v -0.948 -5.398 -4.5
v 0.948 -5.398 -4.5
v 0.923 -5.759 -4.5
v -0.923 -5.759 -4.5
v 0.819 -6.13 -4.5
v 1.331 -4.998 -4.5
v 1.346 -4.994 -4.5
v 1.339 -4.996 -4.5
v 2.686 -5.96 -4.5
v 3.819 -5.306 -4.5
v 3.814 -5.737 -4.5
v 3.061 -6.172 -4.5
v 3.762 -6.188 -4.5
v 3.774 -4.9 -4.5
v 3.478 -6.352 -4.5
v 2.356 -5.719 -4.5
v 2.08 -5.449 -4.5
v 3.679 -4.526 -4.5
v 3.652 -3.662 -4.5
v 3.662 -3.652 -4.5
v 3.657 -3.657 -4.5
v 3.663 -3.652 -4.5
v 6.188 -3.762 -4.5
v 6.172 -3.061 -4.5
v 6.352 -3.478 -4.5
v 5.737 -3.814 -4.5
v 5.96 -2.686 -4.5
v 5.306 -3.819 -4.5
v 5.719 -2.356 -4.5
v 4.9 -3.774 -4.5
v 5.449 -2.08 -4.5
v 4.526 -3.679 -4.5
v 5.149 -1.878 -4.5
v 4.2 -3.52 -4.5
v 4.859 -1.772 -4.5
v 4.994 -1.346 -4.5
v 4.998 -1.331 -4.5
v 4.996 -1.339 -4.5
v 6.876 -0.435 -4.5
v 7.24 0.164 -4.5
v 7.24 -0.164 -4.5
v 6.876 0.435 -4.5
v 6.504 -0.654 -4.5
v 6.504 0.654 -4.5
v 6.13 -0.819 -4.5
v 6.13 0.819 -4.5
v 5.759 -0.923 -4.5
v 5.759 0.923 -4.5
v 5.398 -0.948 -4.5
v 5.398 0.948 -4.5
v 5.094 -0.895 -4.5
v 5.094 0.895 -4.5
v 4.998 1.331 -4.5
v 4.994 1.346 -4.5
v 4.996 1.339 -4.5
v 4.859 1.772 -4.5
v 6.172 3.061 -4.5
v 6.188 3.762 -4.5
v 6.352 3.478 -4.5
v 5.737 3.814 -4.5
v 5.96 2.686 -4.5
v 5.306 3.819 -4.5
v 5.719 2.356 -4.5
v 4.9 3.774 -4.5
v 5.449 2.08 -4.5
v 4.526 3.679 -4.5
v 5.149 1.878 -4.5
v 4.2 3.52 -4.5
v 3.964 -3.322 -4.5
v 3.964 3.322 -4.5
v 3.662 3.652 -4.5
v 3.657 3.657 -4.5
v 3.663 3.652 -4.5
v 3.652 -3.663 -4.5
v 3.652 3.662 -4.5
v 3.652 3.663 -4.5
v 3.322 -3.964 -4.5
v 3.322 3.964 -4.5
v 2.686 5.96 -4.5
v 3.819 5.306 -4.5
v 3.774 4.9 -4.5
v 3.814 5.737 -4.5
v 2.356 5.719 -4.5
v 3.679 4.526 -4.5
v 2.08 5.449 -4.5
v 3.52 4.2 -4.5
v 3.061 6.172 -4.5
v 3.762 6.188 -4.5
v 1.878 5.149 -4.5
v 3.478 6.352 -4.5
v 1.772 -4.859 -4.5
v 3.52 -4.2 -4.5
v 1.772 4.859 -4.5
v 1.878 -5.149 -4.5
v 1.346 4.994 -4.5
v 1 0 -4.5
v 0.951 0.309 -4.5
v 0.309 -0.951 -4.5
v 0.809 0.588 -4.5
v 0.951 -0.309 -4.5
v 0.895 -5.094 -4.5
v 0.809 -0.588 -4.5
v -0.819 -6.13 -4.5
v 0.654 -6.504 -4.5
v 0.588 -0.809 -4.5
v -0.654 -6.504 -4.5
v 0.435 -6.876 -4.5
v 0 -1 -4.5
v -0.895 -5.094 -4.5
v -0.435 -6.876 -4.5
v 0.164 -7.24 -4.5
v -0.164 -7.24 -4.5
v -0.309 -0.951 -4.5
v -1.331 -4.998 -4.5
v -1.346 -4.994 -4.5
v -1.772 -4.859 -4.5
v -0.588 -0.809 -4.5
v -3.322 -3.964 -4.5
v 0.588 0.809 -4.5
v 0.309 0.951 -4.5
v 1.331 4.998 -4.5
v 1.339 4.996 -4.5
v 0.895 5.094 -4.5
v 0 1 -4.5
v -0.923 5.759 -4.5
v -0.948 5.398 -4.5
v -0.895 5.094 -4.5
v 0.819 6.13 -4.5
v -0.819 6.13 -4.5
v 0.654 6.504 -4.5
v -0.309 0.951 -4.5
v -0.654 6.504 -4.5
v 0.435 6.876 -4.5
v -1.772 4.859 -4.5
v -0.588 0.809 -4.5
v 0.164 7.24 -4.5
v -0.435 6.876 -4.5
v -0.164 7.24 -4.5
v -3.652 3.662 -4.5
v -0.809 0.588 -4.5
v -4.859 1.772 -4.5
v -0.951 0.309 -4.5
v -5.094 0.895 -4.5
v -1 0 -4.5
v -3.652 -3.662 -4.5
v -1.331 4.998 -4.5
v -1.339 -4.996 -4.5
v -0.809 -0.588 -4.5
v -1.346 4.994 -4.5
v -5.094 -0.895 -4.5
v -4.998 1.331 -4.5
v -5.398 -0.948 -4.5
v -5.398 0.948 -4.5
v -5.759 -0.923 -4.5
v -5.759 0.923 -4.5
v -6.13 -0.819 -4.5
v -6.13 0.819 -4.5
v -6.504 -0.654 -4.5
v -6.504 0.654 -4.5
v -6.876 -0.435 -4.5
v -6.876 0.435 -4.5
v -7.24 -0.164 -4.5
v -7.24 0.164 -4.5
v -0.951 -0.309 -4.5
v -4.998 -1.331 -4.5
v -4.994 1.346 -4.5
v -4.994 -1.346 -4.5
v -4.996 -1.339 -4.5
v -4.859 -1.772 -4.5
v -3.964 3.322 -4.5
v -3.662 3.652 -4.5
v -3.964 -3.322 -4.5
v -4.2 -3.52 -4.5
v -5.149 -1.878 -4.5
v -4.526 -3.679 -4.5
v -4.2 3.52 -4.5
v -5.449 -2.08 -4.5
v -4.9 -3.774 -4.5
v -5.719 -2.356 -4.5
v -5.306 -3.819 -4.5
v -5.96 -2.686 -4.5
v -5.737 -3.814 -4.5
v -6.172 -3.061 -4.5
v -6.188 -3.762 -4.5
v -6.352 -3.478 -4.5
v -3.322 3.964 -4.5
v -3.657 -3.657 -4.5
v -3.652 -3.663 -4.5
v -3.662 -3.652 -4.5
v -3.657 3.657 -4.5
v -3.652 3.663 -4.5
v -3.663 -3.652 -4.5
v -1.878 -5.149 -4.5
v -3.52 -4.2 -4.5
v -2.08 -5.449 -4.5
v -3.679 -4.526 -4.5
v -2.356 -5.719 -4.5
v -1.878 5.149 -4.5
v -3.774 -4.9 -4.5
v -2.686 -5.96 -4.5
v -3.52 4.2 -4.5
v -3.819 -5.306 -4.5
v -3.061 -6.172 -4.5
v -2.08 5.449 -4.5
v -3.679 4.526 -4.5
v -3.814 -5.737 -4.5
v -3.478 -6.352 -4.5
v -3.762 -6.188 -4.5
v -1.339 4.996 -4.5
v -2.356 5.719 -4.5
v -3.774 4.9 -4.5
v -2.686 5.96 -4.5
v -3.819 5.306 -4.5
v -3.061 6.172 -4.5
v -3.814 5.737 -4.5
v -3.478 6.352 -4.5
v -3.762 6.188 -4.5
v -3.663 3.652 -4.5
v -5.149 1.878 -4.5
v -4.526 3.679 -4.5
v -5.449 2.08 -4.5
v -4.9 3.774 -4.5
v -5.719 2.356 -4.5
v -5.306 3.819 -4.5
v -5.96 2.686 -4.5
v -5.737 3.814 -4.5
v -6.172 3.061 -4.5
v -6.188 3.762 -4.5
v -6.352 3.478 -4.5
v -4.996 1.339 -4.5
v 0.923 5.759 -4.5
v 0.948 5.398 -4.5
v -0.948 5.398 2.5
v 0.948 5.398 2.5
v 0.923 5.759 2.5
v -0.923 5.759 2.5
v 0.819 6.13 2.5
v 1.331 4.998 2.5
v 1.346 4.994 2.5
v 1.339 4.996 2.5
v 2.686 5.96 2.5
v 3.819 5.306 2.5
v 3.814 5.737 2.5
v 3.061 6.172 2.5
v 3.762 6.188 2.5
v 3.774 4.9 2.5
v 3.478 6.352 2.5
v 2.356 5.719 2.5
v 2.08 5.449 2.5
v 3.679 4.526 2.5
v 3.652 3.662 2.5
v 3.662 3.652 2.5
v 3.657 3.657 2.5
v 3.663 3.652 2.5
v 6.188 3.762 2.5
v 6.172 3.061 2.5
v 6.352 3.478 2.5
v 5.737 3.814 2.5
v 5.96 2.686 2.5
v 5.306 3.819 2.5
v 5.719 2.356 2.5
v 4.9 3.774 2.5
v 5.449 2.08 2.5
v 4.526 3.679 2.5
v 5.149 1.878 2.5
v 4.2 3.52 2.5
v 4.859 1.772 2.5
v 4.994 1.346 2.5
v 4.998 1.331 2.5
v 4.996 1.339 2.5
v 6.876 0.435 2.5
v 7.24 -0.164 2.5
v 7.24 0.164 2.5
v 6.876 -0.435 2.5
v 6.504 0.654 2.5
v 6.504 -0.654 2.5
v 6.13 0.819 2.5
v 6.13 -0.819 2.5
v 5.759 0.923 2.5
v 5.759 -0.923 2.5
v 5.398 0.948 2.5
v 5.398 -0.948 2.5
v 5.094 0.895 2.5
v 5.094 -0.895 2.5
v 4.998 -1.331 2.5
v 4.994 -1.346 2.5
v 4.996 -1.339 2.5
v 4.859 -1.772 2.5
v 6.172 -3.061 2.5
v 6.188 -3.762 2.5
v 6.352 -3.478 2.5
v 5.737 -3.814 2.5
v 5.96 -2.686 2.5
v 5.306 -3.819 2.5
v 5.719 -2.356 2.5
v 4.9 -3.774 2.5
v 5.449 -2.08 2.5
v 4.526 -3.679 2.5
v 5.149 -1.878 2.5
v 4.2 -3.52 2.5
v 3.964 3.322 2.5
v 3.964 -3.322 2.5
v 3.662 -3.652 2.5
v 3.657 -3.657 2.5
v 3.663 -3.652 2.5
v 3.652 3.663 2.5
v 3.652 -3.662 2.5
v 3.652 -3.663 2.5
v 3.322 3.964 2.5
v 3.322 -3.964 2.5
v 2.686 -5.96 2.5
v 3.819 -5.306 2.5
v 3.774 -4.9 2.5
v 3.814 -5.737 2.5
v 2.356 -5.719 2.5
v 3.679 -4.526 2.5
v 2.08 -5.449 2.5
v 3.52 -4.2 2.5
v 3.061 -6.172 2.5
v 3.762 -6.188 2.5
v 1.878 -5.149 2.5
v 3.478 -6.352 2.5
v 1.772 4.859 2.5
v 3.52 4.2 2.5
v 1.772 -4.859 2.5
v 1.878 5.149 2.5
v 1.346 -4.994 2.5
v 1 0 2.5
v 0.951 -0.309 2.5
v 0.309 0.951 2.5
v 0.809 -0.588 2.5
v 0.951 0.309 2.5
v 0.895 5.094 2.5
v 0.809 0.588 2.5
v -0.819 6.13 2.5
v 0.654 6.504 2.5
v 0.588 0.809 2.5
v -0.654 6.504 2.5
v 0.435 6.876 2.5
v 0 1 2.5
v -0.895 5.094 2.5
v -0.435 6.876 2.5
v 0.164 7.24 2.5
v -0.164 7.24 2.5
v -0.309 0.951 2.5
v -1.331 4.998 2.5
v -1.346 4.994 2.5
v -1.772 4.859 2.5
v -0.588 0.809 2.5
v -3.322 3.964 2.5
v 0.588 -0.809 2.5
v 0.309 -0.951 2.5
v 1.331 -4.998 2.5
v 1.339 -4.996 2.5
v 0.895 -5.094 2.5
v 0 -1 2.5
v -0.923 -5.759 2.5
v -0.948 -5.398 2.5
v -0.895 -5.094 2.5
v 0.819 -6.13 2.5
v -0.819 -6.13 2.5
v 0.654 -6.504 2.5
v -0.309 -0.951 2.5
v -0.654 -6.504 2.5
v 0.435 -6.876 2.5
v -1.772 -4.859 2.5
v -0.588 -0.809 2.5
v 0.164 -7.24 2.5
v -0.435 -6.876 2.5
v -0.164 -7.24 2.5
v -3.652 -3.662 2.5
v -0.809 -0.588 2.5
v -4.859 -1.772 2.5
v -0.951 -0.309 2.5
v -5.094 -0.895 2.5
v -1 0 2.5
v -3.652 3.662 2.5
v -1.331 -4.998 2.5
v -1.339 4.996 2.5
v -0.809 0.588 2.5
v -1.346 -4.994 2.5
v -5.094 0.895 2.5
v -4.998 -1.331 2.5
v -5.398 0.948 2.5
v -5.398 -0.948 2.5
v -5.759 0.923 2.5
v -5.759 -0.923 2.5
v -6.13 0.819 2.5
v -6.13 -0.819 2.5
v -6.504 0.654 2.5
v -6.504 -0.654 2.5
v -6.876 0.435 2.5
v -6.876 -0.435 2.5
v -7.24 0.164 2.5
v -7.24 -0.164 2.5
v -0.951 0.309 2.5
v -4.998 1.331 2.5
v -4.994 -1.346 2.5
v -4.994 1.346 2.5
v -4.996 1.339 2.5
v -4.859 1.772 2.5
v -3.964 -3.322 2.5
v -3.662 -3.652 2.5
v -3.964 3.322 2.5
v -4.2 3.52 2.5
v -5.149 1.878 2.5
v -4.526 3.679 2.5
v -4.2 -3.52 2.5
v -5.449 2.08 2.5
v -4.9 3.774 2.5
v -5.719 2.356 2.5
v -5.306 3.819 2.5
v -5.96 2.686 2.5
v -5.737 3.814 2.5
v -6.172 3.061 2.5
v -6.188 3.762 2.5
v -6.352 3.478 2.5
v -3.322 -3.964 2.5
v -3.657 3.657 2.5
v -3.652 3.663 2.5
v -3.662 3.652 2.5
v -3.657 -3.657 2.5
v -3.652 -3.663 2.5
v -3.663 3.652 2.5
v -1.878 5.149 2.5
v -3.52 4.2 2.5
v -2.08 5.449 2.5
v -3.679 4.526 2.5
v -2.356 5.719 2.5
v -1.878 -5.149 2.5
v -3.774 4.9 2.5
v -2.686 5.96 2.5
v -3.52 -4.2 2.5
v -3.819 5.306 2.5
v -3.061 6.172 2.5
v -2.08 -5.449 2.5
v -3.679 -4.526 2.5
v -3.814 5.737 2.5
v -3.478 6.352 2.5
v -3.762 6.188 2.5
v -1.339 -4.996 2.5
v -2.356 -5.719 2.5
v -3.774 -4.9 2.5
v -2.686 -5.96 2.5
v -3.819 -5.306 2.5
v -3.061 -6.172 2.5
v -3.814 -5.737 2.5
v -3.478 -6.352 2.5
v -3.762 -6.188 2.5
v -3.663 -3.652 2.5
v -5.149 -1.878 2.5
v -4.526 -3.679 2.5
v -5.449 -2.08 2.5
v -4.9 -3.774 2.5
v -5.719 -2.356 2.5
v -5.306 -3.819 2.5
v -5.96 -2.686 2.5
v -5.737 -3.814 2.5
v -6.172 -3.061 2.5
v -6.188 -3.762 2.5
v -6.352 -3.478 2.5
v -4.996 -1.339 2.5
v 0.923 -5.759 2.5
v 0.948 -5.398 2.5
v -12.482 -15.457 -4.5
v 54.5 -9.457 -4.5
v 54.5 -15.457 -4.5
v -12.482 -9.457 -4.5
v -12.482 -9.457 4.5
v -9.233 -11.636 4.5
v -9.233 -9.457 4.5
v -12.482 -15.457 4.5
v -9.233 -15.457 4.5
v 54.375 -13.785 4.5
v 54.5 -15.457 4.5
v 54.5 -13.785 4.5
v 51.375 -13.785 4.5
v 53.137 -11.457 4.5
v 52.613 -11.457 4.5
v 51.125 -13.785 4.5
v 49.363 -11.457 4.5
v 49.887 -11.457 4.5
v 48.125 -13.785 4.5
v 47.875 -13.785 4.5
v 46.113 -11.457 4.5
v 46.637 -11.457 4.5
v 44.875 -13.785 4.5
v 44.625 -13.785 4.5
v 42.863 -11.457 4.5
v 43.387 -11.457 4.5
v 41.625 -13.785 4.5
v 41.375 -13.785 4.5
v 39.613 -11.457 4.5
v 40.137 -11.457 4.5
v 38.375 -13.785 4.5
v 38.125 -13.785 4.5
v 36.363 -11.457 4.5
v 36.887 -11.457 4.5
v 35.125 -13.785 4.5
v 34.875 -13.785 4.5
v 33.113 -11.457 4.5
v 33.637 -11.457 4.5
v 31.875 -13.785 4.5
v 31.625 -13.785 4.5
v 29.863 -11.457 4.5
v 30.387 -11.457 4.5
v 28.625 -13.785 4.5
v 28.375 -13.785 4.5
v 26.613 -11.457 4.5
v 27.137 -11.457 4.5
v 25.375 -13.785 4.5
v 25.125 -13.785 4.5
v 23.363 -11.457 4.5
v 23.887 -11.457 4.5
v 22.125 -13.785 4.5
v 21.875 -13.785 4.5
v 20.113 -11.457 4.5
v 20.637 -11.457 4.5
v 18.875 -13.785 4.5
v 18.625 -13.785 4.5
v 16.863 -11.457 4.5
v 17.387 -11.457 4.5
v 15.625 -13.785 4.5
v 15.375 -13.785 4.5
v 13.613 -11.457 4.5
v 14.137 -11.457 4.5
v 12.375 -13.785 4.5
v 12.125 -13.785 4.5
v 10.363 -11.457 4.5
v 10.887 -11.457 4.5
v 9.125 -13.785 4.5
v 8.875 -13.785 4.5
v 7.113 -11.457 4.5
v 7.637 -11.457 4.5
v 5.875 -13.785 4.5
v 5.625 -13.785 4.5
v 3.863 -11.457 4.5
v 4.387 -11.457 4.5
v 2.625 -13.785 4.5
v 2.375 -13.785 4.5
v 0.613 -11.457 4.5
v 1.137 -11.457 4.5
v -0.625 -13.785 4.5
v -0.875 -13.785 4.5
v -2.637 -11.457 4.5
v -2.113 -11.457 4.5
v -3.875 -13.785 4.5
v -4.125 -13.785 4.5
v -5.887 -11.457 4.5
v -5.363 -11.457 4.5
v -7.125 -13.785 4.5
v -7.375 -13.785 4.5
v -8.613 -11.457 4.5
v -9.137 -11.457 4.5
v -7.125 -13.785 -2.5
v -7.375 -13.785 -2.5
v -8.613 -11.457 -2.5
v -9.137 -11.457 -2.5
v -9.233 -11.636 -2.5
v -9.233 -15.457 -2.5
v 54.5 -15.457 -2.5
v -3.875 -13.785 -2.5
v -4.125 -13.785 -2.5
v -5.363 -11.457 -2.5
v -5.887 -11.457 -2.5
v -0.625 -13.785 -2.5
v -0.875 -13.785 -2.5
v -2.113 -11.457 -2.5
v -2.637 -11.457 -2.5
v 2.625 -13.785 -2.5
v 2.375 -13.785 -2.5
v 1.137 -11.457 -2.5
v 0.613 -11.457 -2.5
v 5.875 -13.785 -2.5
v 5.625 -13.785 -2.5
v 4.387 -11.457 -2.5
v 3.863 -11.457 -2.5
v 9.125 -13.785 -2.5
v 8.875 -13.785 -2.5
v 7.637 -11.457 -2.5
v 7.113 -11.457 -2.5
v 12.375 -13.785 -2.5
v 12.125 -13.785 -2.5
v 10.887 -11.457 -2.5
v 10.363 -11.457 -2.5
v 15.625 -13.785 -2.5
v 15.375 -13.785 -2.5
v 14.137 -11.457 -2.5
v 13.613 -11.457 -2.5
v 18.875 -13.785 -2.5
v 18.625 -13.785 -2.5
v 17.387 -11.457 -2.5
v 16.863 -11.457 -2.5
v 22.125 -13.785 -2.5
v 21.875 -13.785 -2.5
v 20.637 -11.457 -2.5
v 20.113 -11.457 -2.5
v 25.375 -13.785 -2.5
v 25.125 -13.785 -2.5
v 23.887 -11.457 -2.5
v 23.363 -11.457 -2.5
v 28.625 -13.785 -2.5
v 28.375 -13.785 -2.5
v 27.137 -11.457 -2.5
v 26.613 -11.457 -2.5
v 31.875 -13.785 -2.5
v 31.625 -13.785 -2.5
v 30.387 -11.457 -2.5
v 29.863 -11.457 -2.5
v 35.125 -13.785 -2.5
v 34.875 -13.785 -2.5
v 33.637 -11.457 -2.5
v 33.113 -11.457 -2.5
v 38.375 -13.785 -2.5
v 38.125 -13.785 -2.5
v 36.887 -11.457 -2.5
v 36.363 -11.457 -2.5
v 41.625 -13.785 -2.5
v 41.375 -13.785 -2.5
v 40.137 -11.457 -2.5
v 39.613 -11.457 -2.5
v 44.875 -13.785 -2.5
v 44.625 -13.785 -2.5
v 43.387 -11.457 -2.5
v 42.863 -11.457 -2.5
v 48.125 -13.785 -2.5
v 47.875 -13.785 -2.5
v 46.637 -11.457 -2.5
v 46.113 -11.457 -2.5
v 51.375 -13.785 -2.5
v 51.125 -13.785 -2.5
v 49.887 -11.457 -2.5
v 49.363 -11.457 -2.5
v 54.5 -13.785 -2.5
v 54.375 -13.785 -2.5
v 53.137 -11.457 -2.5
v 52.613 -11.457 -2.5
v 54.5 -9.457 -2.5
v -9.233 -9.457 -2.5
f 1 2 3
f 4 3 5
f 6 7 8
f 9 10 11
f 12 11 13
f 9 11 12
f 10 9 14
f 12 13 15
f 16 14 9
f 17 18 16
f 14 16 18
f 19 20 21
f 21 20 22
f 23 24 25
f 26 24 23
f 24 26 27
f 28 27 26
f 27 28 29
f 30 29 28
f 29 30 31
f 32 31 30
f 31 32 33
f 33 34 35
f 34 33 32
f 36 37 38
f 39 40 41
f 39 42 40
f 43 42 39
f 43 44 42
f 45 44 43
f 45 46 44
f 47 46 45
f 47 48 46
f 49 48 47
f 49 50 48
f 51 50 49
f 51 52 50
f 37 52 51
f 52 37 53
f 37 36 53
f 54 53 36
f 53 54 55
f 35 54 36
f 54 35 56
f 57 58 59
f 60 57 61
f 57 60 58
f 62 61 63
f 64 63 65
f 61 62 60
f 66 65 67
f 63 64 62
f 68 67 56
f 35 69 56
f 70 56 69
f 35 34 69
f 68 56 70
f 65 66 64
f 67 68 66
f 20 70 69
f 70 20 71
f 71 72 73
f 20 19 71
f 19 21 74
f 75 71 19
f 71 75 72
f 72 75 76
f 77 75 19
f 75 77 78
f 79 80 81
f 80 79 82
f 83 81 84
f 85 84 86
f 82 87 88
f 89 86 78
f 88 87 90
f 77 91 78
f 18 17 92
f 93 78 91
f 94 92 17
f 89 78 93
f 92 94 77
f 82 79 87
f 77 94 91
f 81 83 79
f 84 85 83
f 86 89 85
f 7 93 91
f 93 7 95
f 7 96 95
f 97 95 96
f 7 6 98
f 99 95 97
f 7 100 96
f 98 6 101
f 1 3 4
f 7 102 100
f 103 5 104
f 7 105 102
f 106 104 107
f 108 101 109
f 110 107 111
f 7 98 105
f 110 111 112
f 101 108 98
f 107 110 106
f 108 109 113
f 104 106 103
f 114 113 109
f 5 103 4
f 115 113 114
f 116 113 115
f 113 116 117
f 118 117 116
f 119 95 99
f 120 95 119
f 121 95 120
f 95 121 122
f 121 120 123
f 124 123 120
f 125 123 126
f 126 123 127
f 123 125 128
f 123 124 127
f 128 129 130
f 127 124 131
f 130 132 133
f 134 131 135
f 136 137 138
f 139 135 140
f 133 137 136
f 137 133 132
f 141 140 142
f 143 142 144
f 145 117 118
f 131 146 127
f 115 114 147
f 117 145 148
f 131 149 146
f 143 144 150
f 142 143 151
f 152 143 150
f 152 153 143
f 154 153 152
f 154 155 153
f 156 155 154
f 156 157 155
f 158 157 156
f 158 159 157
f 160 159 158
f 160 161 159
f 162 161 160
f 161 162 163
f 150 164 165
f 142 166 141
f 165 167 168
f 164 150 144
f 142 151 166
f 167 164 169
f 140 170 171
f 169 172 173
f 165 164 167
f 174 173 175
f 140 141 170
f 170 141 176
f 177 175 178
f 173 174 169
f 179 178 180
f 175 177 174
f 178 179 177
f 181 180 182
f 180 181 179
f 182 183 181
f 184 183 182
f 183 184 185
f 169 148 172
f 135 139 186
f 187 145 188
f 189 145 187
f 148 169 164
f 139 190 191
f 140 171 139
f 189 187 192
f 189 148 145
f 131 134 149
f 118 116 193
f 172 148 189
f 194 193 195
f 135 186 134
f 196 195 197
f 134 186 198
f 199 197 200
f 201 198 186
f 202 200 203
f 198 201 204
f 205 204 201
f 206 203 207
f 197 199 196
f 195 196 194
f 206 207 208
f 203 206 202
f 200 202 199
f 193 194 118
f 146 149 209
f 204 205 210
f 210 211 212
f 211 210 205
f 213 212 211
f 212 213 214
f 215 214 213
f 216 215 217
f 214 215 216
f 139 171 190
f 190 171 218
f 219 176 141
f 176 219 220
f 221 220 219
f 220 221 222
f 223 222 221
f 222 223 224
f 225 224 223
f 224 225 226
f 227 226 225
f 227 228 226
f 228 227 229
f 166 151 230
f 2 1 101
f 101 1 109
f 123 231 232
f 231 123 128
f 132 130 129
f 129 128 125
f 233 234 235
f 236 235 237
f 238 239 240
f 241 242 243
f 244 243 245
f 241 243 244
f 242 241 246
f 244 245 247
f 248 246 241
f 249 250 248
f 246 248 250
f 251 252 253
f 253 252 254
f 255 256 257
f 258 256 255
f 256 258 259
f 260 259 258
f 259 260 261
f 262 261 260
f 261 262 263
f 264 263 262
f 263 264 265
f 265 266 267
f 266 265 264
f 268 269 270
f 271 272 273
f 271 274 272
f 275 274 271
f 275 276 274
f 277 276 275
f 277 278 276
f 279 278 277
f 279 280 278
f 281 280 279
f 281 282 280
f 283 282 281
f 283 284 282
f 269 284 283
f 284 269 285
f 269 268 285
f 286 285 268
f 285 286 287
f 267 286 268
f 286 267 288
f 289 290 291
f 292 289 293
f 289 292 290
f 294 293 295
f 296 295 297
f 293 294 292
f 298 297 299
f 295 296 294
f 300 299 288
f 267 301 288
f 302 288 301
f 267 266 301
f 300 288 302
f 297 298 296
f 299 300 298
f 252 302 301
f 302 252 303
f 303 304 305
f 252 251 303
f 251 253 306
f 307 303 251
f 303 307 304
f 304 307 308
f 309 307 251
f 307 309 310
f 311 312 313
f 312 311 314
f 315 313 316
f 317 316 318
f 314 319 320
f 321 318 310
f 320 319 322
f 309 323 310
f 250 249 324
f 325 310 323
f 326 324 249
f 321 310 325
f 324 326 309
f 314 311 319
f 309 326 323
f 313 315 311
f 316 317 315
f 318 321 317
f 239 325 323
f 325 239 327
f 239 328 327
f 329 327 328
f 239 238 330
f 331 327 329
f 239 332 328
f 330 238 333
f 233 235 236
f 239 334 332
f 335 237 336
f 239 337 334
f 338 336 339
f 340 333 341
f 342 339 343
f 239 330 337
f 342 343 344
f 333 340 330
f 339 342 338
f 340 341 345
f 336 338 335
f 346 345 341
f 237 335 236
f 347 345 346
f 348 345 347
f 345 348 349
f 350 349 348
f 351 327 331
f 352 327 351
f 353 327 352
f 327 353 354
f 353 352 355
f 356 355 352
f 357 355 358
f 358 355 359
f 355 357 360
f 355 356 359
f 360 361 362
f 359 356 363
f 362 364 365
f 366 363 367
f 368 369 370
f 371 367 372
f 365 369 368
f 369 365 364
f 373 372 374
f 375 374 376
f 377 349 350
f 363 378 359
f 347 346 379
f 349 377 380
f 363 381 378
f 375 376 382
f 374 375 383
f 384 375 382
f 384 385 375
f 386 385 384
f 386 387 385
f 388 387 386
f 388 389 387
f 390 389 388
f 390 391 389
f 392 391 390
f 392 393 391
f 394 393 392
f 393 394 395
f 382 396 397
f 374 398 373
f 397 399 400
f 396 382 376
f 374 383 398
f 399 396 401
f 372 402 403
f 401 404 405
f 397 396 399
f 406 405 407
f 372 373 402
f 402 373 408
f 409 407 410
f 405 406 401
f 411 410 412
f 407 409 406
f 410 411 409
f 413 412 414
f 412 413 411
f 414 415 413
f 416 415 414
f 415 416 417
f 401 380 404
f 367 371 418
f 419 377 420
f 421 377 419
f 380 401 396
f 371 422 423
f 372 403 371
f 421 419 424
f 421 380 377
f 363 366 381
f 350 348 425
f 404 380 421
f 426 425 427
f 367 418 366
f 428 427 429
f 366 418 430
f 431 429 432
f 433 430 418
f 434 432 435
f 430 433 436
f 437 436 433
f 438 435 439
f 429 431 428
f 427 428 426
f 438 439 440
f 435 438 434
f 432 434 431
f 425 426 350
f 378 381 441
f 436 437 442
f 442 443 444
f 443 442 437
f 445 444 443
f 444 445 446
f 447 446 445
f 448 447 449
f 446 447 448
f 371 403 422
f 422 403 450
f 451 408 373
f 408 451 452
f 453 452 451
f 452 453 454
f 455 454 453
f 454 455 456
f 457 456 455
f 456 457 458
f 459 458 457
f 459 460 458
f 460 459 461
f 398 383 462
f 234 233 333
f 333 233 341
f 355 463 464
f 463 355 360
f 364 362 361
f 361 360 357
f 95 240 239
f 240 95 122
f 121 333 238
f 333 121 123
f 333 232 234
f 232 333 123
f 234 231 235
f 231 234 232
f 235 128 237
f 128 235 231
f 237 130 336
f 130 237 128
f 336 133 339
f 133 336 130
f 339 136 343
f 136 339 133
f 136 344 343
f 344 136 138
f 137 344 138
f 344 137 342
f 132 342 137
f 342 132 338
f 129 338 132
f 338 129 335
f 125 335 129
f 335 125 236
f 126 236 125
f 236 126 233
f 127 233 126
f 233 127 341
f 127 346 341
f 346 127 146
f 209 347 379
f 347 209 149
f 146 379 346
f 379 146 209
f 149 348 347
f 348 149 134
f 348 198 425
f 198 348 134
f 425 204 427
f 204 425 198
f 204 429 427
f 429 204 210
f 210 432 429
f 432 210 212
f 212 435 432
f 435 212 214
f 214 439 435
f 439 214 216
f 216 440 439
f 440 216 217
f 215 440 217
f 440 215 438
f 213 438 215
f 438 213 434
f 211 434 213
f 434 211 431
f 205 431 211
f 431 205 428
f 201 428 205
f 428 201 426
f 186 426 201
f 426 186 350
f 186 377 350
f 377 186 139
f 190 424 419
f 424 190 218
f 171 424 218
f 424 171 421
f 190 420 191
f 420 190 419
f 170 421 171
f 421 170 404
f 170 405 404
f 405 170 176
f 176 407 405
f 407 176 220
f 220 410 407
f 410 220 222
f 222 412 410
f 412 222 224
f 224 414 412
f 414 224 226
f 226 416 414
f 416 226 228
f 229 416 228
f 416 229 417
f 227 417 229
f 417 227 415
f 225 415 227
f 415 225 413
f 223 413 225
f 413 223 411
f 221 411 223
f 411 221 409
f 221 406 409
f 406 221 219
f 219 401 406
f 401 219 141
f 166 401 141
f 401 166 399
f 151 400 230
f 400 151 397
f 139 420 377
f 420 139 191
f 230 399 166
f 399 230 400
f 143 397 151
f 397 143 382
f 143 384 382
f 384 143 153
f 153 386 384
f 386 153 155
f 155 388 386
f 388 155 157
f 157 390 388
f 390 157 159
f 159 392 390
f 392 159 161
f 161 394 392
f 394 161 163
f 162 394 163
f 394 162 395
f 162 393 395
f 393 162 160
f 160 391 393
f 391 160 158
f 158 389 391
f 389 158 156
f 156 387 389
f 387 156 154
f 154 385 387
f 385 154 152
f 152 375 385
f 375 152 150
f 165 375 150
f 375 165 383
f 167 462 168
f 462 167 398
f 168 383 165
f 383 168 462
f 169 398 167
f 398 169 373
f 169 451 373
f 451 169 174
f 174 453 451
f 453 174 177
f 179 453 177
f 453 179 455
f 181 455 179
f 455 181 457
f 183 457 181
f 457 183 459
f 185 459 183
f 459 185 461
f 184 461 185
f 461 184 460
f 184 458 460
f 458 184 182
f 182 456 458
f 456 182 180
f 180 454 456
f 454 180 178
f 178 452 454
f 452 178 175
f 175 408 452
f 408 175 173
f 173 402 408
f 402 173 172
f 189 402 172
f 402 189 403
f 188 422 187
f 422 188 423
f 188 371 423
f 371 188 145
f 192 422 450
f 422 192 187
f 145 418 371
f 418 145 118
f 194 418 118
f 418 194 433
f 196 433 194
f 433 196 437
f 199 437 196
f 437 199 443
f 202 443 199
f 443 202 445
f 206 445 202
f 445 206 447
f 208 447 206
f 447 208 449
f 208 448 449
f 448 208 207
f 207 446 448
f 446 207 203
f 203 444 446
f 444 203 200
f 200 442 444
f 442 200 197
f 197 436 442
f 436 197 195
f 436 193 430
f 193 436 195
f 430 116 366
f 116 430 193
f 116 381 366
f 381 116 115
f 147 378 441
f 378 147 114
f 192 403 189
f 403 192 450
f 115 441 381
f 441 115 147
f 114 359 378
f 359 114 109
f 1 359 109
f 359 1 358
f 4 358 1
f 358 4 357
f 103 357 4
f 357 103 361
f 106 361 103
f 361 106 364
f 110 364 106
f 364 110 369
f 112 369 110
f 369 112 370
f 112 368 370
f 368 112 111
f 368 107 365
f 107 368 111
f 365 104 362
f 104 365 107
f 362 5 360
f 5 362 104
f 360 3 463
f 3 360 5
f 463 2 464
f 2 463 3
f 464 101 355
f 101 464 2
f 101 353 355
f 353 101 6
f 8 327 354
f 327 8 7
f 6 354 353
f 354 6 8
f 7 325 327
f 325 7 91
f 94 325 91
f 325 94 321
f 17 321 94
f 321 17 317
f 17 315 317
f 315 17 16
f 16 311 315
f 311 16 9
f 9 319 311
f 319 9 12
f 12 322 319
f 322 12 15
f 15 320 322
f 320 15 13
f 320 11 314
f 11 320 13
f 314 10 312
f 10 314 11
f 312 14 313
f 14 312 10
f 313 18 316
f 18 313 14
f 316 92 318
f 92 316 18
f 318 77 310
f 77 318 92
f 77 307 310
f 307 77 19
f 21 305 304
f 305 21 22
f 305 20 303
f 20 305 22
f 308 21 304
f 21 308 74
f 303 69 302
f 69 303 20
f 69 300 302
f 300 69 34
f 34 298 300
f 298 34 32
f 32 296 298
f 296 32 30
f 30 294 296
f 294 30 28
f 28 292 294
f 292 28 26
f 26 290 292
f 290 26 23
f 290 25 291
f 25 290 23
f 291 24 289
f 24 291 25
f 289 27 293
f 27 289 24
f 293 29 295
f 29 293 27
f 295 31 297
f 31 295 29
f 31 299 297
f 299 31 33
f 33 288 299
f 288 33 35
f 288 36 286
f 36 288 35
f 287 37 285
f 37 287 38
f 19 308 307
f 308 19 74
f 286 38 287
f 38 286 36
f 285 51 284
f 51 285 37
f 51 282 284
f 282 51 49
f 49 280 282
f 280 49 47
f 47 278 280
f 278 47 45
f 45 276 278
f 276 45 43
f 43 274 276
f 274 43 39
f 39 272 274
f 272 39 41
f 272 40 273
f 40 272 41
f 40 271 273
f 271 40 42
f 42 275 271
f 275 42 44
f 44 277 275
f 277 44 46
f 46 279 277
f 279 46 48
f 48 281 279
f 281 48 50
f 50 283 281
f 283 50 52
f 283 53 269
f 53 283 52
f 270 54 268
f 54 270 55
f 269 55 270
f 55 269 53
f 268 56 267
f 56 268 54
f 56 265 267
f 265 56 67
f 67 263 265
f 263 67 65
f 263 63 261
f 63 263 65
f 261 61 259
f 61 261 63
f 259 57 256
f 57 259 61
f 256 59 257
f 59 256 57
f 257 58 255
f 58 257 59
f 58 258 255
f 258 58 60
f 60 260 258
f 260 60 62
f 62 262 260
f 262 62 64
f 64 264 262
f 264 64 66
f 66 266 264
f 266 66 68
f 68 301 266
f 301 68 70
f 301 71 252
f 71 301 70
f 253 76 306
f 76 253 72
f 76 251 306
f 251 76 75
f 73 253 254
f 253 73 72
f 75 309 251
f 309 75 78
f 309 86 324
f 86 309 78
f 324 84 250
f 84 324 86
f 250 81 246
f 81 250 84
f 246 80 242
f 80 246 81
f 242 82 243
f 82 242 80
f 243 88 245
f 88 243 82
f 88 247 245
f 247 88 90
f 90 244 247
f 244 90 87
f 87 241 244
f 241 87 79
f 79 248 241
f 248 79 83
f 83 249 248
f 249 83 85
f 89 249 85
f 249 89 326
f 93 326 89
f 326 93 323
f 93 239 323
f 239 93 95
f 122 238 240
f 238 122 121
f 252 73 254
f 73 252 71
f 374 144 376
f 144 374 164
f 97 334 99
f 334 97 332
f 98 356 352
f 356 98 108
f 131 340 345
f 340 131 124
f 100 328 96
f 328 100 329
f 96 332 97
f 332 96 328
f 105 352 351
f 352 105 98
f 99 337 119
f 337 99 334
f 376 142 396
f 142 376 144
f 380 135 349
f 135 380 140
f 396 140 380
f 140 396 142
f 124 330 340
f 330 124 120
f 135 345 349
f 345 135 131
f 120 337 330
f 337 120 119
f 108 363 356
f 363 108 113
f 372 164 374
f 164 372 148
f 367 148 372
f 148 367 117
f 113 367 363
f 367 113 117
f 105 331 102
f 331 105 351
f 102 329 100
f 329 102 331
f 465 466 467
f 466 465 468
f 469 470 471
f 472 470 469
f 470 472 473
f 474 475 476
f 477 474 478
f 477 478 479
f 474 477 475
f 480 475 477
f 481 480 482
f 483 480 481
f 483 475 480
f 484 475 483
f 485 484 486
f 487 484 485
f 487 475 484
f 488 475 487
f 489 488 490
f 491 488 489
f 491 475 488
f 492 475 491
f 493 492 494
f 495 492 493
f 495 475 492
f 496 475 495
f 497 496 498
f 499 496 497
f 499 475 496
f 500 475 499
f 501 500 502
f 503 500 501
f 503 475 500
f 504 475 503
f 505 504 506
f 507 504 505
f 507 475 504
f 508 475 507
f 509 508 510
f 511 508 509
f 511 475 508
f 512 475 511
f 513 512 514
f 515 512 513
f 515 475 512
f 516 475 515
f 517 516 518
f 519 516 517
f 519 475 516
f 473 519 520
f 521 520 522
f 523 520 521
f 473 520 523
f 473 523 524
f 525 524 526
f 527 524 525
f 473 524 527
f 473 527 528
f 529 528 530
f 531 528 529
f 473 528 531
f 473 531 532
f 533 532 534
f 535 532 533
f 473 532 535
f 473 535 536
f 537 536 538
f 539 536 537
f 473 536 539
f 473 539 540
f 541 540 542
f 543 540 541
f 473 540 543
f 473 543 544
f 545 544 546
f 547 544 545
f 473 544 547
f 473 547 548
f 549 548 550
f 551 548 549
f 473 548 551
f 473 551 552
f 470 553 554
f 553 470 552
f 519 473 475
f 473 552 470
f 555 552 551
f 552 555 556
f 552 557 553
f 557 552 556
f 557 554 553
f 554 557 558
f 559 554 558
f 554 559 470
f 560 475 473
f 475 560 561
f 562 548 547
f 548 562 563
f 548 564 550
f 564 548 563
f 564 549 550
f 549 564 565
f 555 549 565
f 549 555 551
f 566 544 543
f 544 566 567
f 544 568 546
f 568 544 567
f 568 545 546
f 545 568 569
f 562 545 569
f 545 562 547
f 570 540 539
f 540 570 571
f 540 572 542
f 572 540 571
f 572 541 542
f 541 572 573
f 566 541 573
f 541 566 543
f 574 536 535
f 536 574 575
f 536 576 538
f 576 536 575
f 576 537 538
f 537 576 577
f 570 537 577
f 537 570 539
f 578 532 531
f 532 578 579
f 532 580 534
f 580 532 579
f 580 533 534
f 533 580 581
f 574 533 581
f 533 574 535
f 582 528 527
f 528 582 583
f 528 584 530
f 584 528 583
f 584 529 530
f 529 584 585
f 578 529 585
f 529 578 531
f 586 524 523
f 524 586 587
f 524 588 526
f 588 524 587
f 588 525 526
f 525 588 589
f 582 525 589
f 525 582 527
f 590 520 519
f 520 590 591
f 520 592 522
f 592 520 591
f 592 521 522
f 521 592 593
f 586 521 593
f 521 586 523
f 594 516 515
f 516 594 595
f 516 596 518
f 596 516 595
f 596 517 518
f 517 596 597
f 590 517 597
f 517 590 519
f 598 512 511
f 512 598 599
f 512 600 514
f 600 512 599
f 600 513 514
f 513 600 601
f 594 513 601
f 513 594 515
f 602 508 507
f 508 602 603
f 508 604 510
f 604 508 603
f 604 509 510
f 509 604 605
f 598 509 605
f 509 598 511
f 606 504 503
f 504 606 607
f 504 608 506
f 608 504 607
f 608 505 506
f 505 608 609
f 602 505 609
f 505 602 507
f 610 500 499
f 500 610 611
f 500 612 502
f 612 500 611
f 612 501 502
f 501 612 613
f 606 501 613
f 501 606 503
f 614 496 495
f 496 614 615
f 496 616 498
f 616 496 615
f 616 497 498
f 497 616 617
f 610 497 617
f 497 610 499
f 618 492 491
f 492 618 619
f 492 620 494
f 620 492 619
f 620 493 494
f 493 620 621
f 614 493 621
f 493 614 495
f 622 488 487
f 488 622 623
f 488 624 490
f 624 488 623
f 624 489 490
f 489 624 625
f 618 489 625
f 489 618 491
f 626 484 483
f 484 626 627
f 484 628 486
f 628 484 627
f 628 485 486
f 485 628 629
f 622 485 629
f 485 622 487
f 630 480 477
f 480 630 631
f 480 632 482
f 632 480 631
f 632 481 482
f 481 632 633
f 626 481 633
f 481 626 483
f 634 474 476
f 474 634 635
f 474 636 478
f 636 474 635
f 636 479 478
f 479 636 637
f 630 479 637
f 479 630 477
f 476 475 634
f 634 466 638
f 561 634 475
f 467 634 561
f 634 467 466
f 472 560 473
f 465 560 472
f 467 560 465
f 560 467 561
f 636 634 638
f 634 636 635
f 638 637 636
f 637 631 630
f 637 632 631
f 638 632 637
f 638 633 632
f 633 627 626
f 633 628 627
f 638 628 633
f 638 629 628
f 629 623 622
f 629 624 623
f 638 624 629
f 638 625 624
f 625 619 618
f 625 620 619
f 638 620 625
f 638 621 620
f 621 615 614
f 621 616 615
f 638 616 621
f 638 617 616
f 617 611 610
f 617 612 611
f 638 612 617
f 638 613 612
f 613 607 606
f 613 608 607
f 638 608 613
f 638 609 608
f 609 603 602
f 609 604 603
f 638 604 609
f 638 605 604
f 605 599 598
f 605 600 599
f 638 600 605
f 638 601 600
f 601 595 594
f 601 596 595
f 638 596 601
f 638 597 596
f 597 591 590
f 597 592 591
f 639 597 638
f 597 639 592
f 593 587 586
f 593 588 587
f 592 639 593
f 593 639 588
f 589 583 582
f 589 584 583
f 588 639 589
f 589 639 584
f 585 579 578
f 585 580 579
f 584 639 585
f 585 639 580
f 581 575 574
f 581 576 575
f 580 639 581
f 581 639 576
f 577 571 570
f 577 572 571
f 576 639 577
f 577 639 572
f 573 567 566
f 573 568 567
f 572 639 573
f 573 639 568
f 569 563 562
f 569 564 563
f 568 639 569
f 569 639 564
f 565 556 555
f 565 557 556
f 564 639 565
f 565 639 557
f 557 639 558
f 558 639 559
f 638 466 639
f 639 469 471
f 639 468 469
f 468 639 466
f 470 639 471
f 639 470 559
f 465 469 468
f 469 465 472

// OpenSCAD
//This is a modification of " Public Domain Parametric Involute Spur Gear (and involute helical gear and involute rack)
// by Leemon Baird, 2011, Leemon@Leemon.com
//http://www.thingiverse.com/thing:5505  "

//Modifications by racatack June 2016:
// v1.0, 6/24/16:
//  -Incorporated 'module InvoluteGear_rack()' from the 11/11/15 comment by quisam2342 in thing:5505 to fix noted problems in rack generation at various tooth sizes
//  -Added a section for an optional 'backboard' that can be used to stiffen an otherwise skinny rack
//  -Added sections for optional Stop Blocks at either or both ends of a rack
//  -Removed extra gears from the example since I only need one pinion. See thing:5505 example section to gain more insight into gear generation.
//v1.1, 6/28/16:
//  -Added sections to optionally create mounting flanges on the bottom/backside of the rack. Flanges can be at either or both ends, or longitudinal.
//v1.1.1, 2/26/2024
//  -Added line 221 for generation of a pinion with no rack. Previously, if zero rack teeth was input, 2 teeth were generated anyway, because loops and math and stuff.

//TO GENERATE A CUSTOM RACK AND PINION ENTER INPUTS AT LINES 345-380


//////////////////////////////////////////////////////////////////////////////////////////////
// Public Domain Parametric Involute Spur Gear (and involute helical gear and involute rack)
// version 1.1
// by Leemon Baird, 2011, Leemon@Leemon.com
//http://www.thingiverse.com/thing:5505
//
// This file is public domain.  Use it for any purpose, including commercial
// applications.  Attribution would be nice, but is not required.  There is
// no warranty of any kind, including its correctness, usefulness, or safety.
// 
// This is parameterized involute spur (or helical) gear.  It is much simpler and less powerful than
// others on Thingiverse.  But it is public domain.  I implemented it from scratch from the 
// descriptions and equations on Wikipedia and the web, using Mathematica for calculations and testing,
// and I now release it into the public domain.
//
//		http://en.wikipedia.org/wiki/Involute_gear
//		http://en.wikipedia.org/wiki/Gear
//		http://en.wikipedia.org/wiki/List_of_gear_nomenclature
//		http://gtrebaol.free.fr/doc/catia/spur_gear.html
//		http://www.cs.cmu.edu/~rapidproto/mechanisms/chpt7.html
//
// The module gear() gives an involute spur gear, with reasonable defaults for all the parameters.
// Normally, you should just choose the first 4 parameters, and let the rest be default values.
// The module gear() gives a gear in the XY plane, centered on the origin, with one tooth centered on
// the positive Y axis.  The various functions below it take the same parameters, and return various
// measurements for the gear.  The most important is pitch_radius, which tells how far apart to space
// gears that are meshing, and adendum_radius, which gives the size of the region filled by the gear.
// A gear has a "pitch circle", which is an invisible circle that cuts through the middle of each
// tooth (though not the exact center). In order for two gears to mesh, their pitch circles should 
// just touch.  So the distance between their centers should be pitch_radius() for one, plus pitch_radius() 
// for the other, which gives the radii of their pitch circles.
//
// In order for two gears to mesh, they must have the same mm_per_tooth and pressure_angle parameters.  
// mm_per_tooth gives the number of millimeters of arc around the pitch circle covered by one tooth and one
// space between teeth.  The pitch angle controls how flat or bulged the sides of the teeth are.  Common
// values include 14.5 degrees and 20 degrees, and occasionally 25.  Though I've seen 28 recommended for
// plastic gears. Larger numbers bulge out more, giving stronger teeth, so 28 degrees is the default here.
//
// The ratio of number_of_teeth for two meshing gears gives how many times one will make a full 
// revolution when the the other makes one full revolution.  If the two numbers are coprime (i.e. 
// are not both divisible by the same number greater than 1), then every tooth on one gear
// will meet every tooth on the other, for more even wear.  So coprime numbers of teeth are good.
//
// The module rack() gives a rack, which is a bar with teeth.  A rack can mesh with any
// gear that has the same mm_per_tooth and pressure_angle.
//
// Some terminology: 
// The outline of a gear is a smooth circle (the "pitch circle") which has mountains and valleys
// added so it is toothed.  So there is an inner circle (the "root circle") that touches the 
// base of all the teeth, an outer circle that touches the tips of all the teeth,
// and the invisible pitch circle in between them.  There is also a "base circle", which can be smaller than
// all three of the others, which controls the shape of the teeth.  The side of each tooth lies on the path 
// that the end of a string would follow if it were wrapped tightly around the base circle, then slowly unwound.  
// That shape is an "involute", which gives this type of gear its name.
//
//////////////////////////////////////////////////////////////////////////////////////////////

//An involute spur gear, with reasonable defaults for all the parameters.
//Normally, you should just choose the first 4 parameters, and let the rest be default values.
//Meshing gears must match in mm_per_tooth, pressure_angle, and twist,
//and be separated by the sum of their pitch radii, which can be found with pitch_radius().
module gear (
	mm_per_tooth    = 3,    //this is the "circular pitch", the circumference of the pitch circle divided by the number of teeth
	number_of_teeth = 11,   //total number of teeth around the entire perimeter
	thickness       = 6,    //thickness of gear in mm
	hole_diameter   = 3,    //diameter of the hole in the center, in mm
	twist           = 0,    //teeth rotate this many degrees from bottom of gear to top.  360 makes the gear a screw with each thread going around once
	teeth_to_hide   = 0,    //number of teeth to delete to make this only a fraction of a circle
	pressure_angle  = 28,   //Controls how straight or bulged the tooth sides are. In degrees.
	clearance       = 0.0,  //gap between top of a tooth on one gear and bottom of valley on a meshing gear (in millimeters)
	backlash        = 0.0   //gap between two meshing teeth, in the direction along the circumference of the pitch circle
) {
	assign(pi = 3.1415926)
	assign(p  = mm_per_tooth * number_of_teeth / pi / 2)  //radius of pitch circle
	assign(c  = p + mm_per_tooth / pi - clearance)        //radius of outer circle
	assign(b  = p*cos(pressure_angle))                    //radius of base circle
	assign(r  = p-(c-p)-clearance)                        //radius of root circle
	assign(t  = mm_per_tooth/2-backlash/2)                //tooth thickness at pitch circle
	assign(k  = -iang(b, p) - t/2/p/pi*180) {             //angle to where involute meets base circle on each side of tooth
		difference() {
			for (i = [0:number_of_teeth-teeth_to_hide-1] )
				rotate([0,0,i*360/number_of_teeth])
					linear_extrude(height = thickness, center = true, convexity = 10, twist = twist)
						polygon(
							points=[
								[0, -hole_diameter/10],
								polar(r, -181/number_of_teeth),
								polar(r, r<b ? k : -180/number_of_teeth),
								q7(0/5,r,b,c,k, 1),q7(1/5,r,b,c,k, 1),q7(2/5,r,b,c,k, 1),q7(3/5,r,b,c,k, 1),q7(4/5,r,b,c,k, 1),q7(5/5,r,b,c,k, 1),
								q7(5/5,r,b,c,k,-1),q7(4/5,r,b,c,k,-1),q7(3/5,r,b,c,k,-1),q7(2/5,r,b,c,k,-1),q7(1/5,r,b,c,k,-1),q7(0/5,r,b,c,k,-1),
								polar(r, r<b ? -k : 180/number_of_teeth),
								polar(r, 181/number_of_teeth)
							],
 							paths=[[0,1,2,3,4,5,6,7,8,9,10,11,12,13,14,15,16]]
						);
			cylinder(h=2*thickness+1, r=hole_diameter/2, center=true, $fn=20);
		}
	}
};	
//these 4 functions are used by gear
function polar(r,theta)   = r*[sin(theta), cos(theta)];                            //convert polar to cartesian coordinates
function iang(r1,r2)      = sqrt((r2/r1)*(r2/r1) - 1)/3.1415926*180 - acos(r1/r2); //unwind a string this many degrees to go from radius r1 to radius r2
function q7(f,r,b,r2,t,s) = q6(b,s,t,(1-f)*max(b,r)+f*r2);                         //radius a fraction f up the curved side of the tooth 
function q6(b,s,t,d)      = polar(d,s*(iang(b,d)+t));                              //point at radius d on the involute curve

//a rack, which is a straight line with teeth (the same as a segment from a giant gear with a huge number of teeth).
//The "pitch circle" is a line along the X axis.
//module rack (
//	mm_per_tooth    = 3,    //this is the "circular pitch", the circumference of the pitch circle divided by the number //of teeth
//	number_of_teeth = 11,   //total number of teeth along the rack
//	thickness       = 6,    //thickness of rack in mm (affects each tooth)
//	height          = 120,   //height of rack in mm, from tooth top to far side of rack.
//	pressure_angle  = 28,   //Controls how straight or bulged the tooth sides are. In degrees.
//	backlash        = 0.0   //gap between two meshing teeth, in the direction along the circumference of the pitch circle
//) {
//	assign(pi = 3.1415926)
//	assign(a = mm_per_tooth / pi) //addendum
//	assign(t = a*cos(pressure_angle)-1)         //tooth side is tilted so top/bottom corners move this amount
//		for (i = [0:number_of_teeth-1] )
//			translate([i*mm_per_tooth,0,0])
//				linear_extrude(height = thickness, center = true, convexity = 10)
//					polygon(
//						points=[
//							[-mm_per_tooth * 3/4,                 a-height],
//							[-mm_per_tooth * 3/4 - backlash,     -a],
//							[-mm_per_tooth * 1/4 + backlash - t, -a],
//							[-mm_per_tooth * 1/4 + backlash + t,  a],
//							[ mm_per_tooth * 1/4 - backlash - t,  a],
//							[ mm_per_tooth * 1/4 - backlash + t, -a],
//							[ mm_per_tooth * 3/4 + backlash,     -a],
//							[ mm_per_tooth * 3/4,                 a-height],
//						],
//						paths=[[0,1,2,3,4,5,6,7]]
//					);
//};	


  //rac note - This section generates the rack body and teeth. It is from the 11/11/15 comment by quisam2342 in thing:5505 to fix noted problems with rack generation, and replaces the original 'module rack()'
////////////////////////////////////////////////////////////////////////////////////////////////
// The module InvoluteGear_rack() gives a involute gear rack, which is a bar with teeth.
// A rack can mesh with any gear that has the same mm_per_tooth and pressure_angle.
// The "pitch circle" is a line along the X axis.
//
// mm_per_tooth     this is the "circular pitch", the circumference of the pitch circle
//                  divided by the number of teeth
//
// number_of_teeth  total number of teeth along the rack
//
// thickness        thickness of rack in mm
//
// height           height of rack in mm, from tooth top to far side of rack
//
// pressure_angle   controls how straight or bulged the tooth sides are, in degrees
//
// clearance        gap between top of a tooth on one gear and bottom of valley
//                  on a meshing gear, in millimeters
//
// backlash         gap between two meshing teeth, in the direction along the circumference
//                  of the pitch circle
////////////////////////////////////////////////////////////////////////////////////////////////



module InvoluteGear_rack (

   //Default numbers in this section get overridden by numbers in 'example rack and pinion' section, so set your values there.
   
    mm_per_tooth    = 3, //all meshing gears need the same mm_per_tooth 
    number_of_teeth = 11,
    thickness       = 6,
    height          = 4,
    
  //rac - Added variables for backboard, stop blocks and mounting flanges: 
 //set your values in the 'example rack and pinion' section, as defaults given here will be overridden by that section 
    backboard_thickness = 2.0,
    backboard_height = 1.0,
    side_flange_thickness = 0,
    side_flange_height = 0,
    flange_offset = 0, 
    stop_height = backboard_height,
    left_stop_enable = 1, 
    right_stop_enable = 1,
    flange_height = 0,
    left_flange_enable = 1, 
    right_flange_enable = 1,
    
//These defaults are not redefined in the example section:
    pressure_angle  = 28,  //all meshing gears need the same pressure_angle
    clearance       = 0.0,
    backlash        = 0.0

)

{
    // addendum - tooth height above pitch line
    assign(addendum =        module_value(mm_per_tooth) - clearance)

    // dedendum - tooth height below pitch line
    assign(dedendum = 1.25 * module_value(mm_per_tooth)            ) 


    for (i = [0:number_of_teeth-1] )
        if (number_of_teeth > 0)
        translate([(i+0.5)*mm_per_tooth,height-addendum,0])
            linear_extrude(height = thickness, center = true, convexity = 10)  //'height' parameter here is not the same as 'height' parameter of module. Here it effectively is the width or thickness as the rack is extruded from one side-face to the other.
                polygon(
                    points=[
                        [-1/2 * mm_per_tooth,                                              addendum-height],
                        [-1/2 * mm_per_tooth,                                             -dedendum],
                        [-1/4 * mm_per_tooth + backlash - dedendum * tan(pressure_angle), -dedendum],
                        [-1/4 * mm_per_tooth + backlash + addendum * tan(pressure_angle),  addendum],
                        [ 1/4 * mm_per_tooth - backlash - addendum * tan(pressure_angle),  addendum],
                        [ 1/4 * mm_per_tooth - backlash + dedendum * tan(pressure_angle), -dedendum],
                        [ 1/2 * mm_per_tooth,                                             -dedendum],
                        [ 1/2 * mm_per_tooth,                                              addendum-height],
                    ],
                    paths=[[0,1,2,3,4,5,6,7]]
                );

   //rac -added - This section optionally creates a 'stop block' at the left end of the rack
            translate([(-0.11)*mm_per_tooth,0,0.5*(-thickness)])  
            linear_extrude(height = left_stop_enable*thickness, center = false, convexity = 10)
                polygon(
                    points=[
                        [-1/2 * mm_per_tooth,height+stop_height],   //stop_height extends stop block above teeth, change the number to change the extension amount
                        [-1/2 * mm_per_tooth,0],
                        [ 1/2 * mm_per_tooth,0],
                        [ 1/2 * mm_per_tooth,height+stop_height],   //stop_height extends stop block above teeth, change the number to change the extension amount
                    ],
                    paths=[[0,1,2,3]]
                );


    //rac -added - This section optionally creates a 'stop block' at the right end of the rack
            translate([(0.11+number_of_teeth)*mm_per_tooth,0,0.5*(-thickness)])  
            linear_extrude(height = right_stop_enable*thickness, center = false, convexity = 10)
                polygon(
                    points=[
                        [-1/2 * mm_per_tooth,height+stop_height],   //stop_height extends stop block above teeth
                        [-1/2 * mm_per_tooth,0],
                        [ 1/2 * mm_per_tooth,0],
                        [ 1/2 * mm_per_tooth,height+stop_height],   //stop_height extends stop block above teeth
                    ],
                    paths=[[0,1,2,3]]
                );


    //rac -added - This section optionally creates a flange at the left rear of the rack
            translate([(-0.11)*mm_per_tooth,0,0.5*(-thickness)])   
            linear_extrude(height = left_flange_enable*thickness, center = false, convexity = 10)
                polygon(
                    points=[
                        [-1/2 * mm_per_tooth,-flange_height],   //flange_height extends flange beyond rack bottom
                        [-1/2 * mm_per_tooth,0],
                        [ 1/2 * mm_per_tooth,0],
                        [ 1/2 * mm_per_tooth,-flange_height],   //flange_height extends flange beyond rack bottom
                    ],
                    paths=[[0,1,2,3]]
                );



    //rac -added - This section optionally creates a flange at the right rear of the rack
            translate([(0.11+number_of_teeth)*mm_per_tooth,0,0.5*(-thickness)])  
            linear_extrude(height = right_flange_enable*thickness, center = false, convexity = 10)
                polygon(
                    points=[
                        [-1/2 * mm_per_tooth,-flange_height],   //flange_height extends flange beyond rack bottom
                        [-1/2 * mm_per_tooth,0],
                        [ 1/2 * mm_per_tooth,0],
                        [ 1/2 * mm_per_tooth,-flange_height],   //flange_height extends flange beyond rack bottom
                    ],
                    paths=[[0,1,2,3]]
                );



    //rac -added - This section optionally creates a 'Backboard' on one side of the rack. Can be used to add stiffness for a 'thin' rack (i.e. a rack with low height and/or thickness numbers) or if a large negative height is used it can extend under the rack as a mounting flange.
    for (i = [0:number_of_teeth-1] )
        translate([(i+0.5)*mm_per_tooth,0,0.5*(-thickness+backboard_thickness)])    
        //0.5*(-thickness+backboard_thickness) starts the backboard at one side of the rack and extrudes it inward
            linear_extrude(height = backboard_thickness, center = true, convexity = 10)
                polygon(
                    points=[
                        [-1/2 * mm_per_tooth,height+backboard_height],   //backboard_height extends backboard above teeth
                        [-1/2 * mm_per_tooth,0],

                        [ 1/2 * mm_per_tooth,0],
                        [ 1/2 * mm_per_tooth,height+backboard_height],   //backboard_height extends backboard above teeth
                    ],
                    paths=[[0,1,2,3]]
                );


    //rac -added - This section optionally creates a Rear Side-Flange on along one side of the rack. Can be used to add stiffness for a 'thin' rack (i.e. a rack with low height and/or thickness numbers) or it can be used as a mounting flange.
    for (i = [0:number_of_teeth-1] )
        translate([(i+0.5)*mm_per_tooth,0,0.5*(-thickness+side_flange_thickness)+flange_offset])    
        //0.5*(-side_flange_thickness) starts the backboard at one side of the rack and extrudes it inward. flange_offset moves the flange toward the other side of the rack
            linear_extrude(height = side_flange_thickness, center = true, convexity = 10)
                polygon(
                    points=[
                        [-1/2 * mm_per_tooth,-side_flange_height],   //side_flange_height extends side_flange beyond rack bottom
                        [-1/2 * mm_per_tooth,0],

                        [ 1/2 * mm_per_tooth,0],
                        [ 1/2 * mm_per_tooth,-side_flange_height],   //side_flange_height extends backboard beyond rack bottom
                    ],
                    paths=[[0,1,2,3]]
                );

}


//These 5 functions let the user find the derived dimensions of the gear.
//A gear fits within a circle of radius outer_radius, and two gears should have
//their centers separated by the sum of their pictch_radius.
function circular_pitch  (mm_per_tooth=3) = mm_per_tooth;                     //tooth density expressed as "circular pitch" in millimeters
function diametral_pitch (mm_per_tooth=3) = 3.1415926 / mm_per_tooth;         //tooth density expressed as "diametral pitch" in teeth per millimeter
function module_value    (mm_per_tooth=3) = mm_per_tooth / 3.1415926;                //tooth density expressed as "module" or "modulus" in millimeters
function pitch_radius    (mm_per_tooth=3,number_of_teeth=11) = mm_per_tooth * number_of_teeth / 3.1415926 / 2;
function outer_radius    (mm_per_tooth=3,number_of_teeth=11,clearance=0.1)    //The gear fits entirely within a cylinder of this radius.
	= mm_per_tooth*(1+number_of_teeth/2)/3.1415926  - clearance;              





//////////////////////////////////////////////////////////////////////////////////////////////

//GENERATE A RACK AND PINION 
//ENTER YOUR VALUES HERE: (not in defaults of InvoluteGear_rack() or gear() modules)

//The variable names can be confusing - experiment! Change something then click the dotted cube with Fast-Forward arrows.

//example rack and pinion:
//all distances in mm
n1 = 12; //red gear number of teeth. Set to zero if you don't want to generate a pinion.
n5 = 20;  //gray rack number of teeth.  Set to 0 if you don't want to generate a rack. (For no rack also set Backboard and Side Flange thicknesses to 0, and disable End Stops and End Flanges below or they will generate a blob next to the pinion.)
mm_per_tooth = 3.25;
thickness    = 9;  // depth of the rack from side-to-side, including backboard if any. The pinion will be this depth minus the backboard_thickness
hole         = 2;   //hole diameter in pinion gear
height       = 4;  // distance from bottom of the rack to the tips of the teeth

//rac-Added - Set your values here for  a Backboard along one side of the teeth.
backboard_thickness = 2; //set to zero for no backboard
    backboard_height = 2;   //set to zero for top of backboard to be even with tips of teeth, a positive number will extend above the teeth by the chosen amount. Negative number will place the top of the backboard lower than the teeth.

//rac-Added - Set your values here for a rear Side-Flange along one side of the teeth extending to the rear of the rack (opposite the direction of a backboard).
side_flange_thickness = 0; //set to zero for no rear Side-Flange
    side_flange_height = 6; // A positive number extends the side-flange beyond the bottom of the rack the by specified amount.
    flange_offset = 0; //Set to zero for a flange running coplanar with one side of the teeth. A positive number moves the flange toward other side of the teeth

//rac-Added - Set your values here for Stop Blocks at one or both ends.
stop_height = 2; //Stop Blocks will extend this much above the teeth. A positive number will extend above the teeth by the chosen amount. Negative number will place the top of the block lower than the teeth. 
    left_stop_enable = 1;  //set to 1 to generate Left Stop Block, set to 0 to disable
    right_stop_enable = 0;  //set to 1 to generate Right Stop Block, set to 0 to disable

//rac-Added - Set your values here for rear End-Flanges at one or both ends.    
flange_height = 8; //Flanges will extend this much from the bottom of the rack. ****Combine with 0 height Stop Blocks to effectively start flanges at top of tooth instead of backside.****
    left_flange_enable = 0;  //set to 1 to generate Left Rear Flange, set to 0 to disable. 
    right_flange_enable = 0;  //set to 1 to generate Right Rear Flange, set to 0 to disable.
//end of inputs -------------------------------------------------------

d1 =pitch_radius(mm_per_tooth,n1);

//Generation of pinion gear:
translate([ 0,    0, -.5*backboard_thickness]) rotate([0,0, $t*360/n1])                 color([1.00,0.75,0.75]) gear(mm_per_tooth,n1,(thickness-backboard_thickness),hole); //rac -RE above: 'thickness-backboard_thickness' is used here to reduce gear thickness for backboard on rack, The '-.5*backboard_thickness' in translate puts gear bottom even with rack bottom

//Generation of rack, and Relative positioning of gear and rack:
translate([(-floor(n5/2)-floor(n1/2)+$t+n1/2-1/2), -height-backboard_height-d1-mm_per_tooth, 0]) rotate([0,0,0]) color([0.75,0.75,0.75]) InvoluteGear_rack(mm_per_tooth,n5,thickness,height,backboard_thickness,backboard_height,side_flange_thickness,side_flange_height,flange_offset,stop_height,left_stop_enable,right_stop_enable,flange_height,left_flange_enable,right_flange_enable);   //rac - In the above 'translate' instruction, the middle parameter sets spacing between the rack and the pinion. I've set it to '-height-backboard_height-d1-mm_per_tooth' to give a proportionate offset that allows for ease of printing for most sets of gear & rack parameters. If you use a large NEGATIVE backboard height THE GEAR AND RACK MAY OVERLAP. That can be fixed by substituting some other number/formula for '-height-backboard_height-d1-mm_per_tooth'. Try for example -3*d1, or just subtract an additional fixed offset from what's in there now (e.g. (-height-backboard_height-d1-mm_per_tooth)-14.)

//end of example rack and pinion 
//////////////////////////////////////////////////////////////////////////////////////////////////
